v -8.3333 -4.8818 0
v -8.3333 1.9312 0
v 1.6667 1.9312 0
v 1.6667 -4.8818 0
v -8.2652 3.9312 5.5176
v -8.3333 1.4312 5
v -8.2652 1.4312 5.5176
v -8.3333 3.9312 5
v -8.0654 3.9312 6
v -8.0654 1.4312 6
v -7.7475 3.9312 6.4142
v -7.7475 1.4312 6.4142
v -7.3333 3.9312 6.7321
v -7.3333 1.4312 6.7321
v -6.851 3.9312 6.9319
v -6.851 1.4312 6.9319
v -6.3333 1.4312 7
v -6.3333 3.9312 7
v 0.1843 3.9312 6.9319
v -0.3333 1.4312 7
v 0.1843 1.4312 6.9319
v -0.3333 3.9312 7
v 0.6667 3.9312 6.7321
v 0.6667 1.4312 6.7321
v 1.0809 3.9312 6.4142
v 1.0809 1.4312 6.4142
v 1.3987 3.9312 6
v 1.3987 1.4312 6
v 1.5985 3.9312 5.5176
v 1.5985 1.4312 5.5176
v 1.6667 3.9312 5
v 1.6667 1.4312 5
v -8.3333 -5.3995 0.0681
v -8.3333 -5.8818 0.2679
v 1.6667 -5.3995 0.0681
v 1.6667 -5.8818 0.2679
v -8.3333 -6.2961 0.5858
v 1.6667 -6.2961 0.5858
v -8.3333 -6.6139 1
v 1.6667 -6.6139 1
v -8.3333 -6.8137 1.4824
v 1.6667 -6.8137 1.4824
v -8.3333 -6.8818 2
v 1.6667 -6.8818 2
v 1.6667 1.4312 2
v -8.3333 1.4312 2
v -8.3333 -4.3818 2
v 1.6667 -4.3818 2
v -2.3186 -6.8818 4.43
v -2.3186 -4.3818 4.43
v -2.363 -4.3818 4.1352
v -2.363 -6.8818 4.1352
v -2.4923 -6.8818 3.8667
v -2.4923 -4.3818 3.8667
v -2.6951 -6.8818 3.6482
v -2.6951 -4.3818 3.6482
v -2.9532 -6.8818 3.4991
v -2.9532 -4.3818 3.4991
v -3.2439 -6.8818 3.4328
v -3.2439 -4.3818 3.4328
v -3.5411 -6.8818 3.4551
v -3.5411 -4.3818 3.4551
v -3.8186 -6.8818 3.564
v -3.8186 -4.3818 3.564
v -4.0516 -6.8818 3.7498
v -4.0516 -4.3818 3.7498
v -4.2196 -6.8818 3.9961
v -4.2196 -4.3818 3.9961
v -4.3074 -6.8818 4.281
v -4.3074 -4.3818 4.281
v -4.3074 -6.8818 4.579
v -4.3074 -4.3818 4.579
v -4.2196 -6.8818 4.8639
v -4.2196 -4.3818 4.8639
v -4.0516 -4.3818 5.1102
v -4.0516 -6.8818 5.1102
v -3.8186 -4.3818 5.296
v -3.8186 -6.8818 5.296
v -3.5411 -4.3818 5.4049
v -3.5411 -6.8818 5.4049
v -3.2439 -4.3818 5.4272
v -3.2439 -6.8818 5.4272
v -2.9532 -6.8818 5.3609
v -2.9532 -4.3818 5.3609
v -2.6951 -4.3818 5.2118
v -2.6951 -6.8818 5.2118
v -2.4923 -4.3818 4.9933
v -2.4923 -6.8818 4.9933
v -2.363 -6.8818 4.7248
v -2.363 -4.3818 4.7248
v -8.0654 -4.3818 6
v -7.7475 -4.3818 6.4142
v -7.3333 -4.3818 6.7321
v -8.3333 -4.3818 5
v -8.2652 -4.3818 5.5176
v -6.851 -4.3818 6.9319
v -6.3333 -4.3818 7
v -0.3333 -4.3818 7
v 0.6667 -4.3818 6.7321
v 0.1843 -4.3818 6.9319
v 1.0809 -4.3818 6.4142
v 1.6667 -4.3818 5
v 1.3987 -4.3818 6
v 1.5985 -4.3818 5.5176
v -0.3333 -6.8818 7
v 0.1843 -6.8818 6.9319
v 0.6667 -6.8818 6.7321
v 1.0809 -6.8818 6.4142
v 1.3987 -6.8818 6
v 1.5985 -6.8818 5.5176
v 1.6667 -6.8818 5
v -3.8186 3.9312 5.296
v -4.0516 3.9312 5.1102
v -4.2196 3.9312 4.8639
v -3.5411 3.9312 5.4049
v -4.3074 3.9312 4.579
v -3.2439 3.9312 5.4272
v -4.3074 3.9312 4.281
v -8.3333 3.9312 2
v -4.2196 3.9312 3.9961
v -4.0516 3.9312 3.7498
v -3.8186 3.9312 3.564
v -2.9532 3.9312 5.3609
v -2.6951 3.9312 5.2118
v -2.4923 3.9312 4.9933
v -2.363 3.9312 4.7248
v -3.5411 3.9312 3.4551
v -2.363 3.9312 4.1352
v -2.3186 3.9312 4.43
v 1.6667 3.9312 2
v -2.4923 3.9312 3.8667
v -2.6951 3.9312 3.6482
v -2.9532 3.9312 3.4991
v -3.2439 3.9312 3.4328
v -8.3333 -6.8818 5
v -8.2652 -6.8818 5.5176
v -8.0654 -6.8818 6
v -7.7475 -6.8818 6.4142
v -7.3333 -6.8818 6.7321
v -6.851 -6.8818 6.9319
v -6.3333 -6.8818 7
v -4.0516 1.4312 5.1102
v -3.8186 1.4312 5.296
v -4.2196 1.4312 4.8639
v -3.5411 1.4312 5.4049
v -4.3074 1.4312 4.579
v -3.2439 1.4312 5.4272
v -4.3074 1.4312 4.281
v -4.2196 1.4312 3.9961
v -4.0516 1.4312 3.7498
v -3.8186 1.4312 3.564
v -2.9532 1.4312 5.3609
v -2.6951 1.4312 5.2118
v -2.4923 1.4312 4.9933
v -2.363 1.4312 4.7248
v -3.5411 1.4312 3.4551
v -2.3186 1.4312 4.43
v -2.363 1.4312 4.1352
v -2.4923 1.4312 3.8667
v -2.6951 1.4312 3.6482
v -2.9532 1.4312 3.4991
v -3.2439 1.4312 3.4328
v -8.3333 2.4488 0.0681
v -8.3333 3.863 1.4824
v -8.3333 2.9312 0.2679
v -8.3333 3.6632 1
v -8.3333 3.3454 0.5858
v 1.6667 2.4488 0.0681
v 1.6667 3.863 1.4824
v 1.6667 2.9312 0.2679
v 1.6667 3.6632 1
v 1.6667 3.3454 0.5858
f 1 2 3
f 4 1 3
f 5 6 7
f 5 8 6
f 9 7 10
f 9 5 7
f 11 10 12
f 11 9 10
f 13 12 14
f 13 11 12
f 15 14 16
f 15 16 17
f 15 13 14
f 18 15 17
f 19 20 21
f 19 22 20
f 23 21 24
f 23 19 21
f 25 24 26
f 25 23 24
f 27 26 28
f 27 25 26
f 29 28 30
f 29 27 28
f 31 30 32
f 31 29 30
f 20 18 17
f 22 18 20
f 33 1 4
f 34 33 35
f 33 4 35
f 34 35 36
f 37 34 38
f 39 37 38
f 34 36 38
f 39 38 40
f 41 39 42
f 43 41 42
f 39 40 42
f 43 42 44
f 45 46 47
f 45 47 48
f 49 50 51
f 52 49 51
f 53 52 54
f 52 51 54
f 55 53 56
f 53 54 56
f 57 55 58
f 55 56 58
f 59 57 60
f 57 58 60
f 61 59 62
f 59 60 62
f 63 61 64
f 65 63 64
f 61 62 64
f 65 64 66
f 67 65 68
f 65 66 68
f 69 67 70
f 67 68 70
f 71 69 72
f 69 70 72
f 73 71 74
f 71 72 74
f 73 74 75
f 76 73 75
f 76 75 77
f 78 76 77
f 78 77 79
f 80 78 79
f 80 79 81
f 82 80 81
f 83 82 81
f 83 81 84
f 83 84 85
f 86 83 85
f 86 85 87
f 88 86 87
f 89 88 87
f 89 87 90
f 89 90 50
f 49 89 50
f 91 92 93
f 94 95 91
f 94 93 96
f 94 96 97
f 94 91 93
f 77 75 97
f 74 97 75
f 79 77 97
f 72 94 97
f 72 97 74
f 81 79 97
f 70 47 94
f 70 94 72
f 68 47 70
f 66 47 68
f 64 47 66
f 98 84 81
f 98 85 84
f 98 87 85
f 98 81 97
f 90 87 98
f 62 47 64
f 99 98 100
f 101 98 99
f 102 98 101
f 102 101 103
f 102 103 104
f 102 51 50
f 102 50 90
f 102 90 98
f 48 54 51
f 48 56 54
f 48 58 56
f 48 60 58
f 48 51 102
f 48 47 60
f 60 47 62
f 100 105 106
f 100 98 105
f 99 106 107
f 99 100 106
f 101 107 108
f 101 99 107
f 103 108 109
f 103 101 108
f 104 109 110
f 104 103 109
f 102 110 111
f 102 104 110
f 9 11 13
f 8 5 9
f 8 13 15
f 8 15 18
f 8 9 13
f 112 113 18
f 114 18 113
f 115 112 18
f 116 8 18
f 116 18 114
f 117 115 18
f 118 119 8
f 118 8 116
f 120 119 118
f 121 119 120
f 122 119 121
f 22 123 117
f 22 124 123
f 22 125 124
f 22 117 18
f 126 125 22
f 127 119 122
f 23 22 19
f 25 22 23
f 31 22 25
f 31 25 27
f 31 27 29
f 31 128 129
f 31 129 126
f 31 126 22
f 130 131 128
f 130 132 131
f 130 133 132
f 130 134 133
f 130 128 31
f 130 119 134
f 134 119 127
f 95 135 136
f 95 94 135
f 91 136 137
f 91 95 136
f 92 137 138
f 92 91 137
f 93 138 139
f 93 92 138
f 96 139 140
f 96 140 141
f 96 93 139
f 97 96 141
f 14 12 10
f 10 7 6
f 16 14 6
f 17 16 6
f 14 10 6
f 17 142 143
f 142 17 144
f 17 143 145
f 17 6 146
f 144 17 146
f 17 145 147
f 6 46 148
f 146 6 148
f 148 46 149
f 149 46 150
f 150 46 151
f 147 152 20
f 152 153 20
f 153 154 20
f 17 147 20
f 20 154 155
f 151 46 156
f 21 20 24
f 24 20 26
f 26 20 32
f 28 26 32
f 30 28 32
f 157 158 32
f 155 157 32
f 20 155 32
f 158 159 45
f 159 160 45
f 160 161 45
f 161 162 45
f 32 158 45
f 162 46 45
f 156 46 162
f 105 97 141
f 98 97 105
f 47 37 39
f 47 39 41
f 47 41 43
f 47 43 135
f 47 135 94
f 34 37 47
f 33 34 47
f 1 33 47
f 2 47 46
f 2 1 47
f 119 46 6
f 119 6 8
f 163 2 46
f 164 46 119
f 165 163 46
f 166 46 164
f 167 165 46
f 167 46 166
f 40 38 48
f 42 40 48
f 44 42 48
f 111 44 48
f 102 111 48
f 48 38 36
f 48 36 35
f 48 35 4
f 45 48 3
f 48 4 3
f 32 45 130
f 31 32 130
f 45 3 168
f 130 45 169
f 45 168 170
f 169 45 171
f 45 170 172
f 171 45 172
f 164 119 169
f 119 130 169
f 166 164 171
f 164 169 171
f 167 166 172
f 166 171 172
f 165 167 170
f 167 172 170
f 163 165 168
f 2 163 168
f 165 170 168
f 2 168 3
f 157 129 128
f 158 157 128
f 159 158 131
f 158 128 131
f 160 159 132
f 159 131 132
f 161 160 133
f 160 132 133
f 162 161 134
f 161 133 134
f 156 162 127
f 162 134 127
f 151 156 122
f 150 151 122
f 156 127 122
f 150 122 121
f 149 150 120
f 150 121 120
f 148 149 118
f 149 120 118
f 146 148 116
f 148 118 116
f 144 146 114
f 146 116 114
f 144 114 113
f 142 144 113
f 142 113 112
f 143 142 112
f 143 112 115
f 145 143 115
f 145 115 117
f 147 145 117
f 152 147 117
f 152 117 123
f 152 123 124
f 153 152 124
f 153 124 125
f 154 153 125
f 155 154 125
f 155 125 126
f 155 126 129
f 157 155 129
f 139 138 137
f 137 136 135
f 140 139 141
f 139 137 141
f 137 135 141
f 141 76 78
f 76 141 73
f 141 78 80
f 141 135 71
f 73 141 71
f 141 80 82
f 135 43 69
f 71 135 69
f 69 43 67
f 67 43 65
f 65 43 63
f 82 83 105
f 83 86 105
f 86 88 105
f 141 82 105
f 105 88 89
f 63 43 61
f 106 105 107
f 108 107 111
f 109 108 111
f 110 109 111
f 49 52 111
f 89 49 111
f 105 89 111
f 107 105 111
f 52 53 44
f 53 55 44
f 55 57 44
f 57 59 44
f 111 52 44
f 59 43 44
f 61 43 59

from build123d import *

# Parameters (mm, degrees)
SKETCH1_W           = 10
SKETCH1_H           = 10.813
BOSS_EXTRUDE1_DEPTH = 2
SKETCH2_W           = 10
SKETCH2_H           = 2.5
BOSS_EXTRUDE2_DEPTH = 5
SKETCH3_R           = 1
CUT_EXTRUDE1_DEPTH  = 11.813
FILLET2_R           = 2


with BuildPart() as part:
    # Sketch1 → Boss-Extrude1 (new body)
    with BuildSketch(Plane.XY):
        with Locations((-3.333333333, -1.47534058)):
            Rectangle(SKETCH1_W, SKETCH1_H)
    extrude(amount=BOSS_EXTRUDE1_DEPTH)

    # Sketch2 → Boss-Extrude2 (add)
    with BuildSketch(Plane.XY.offset(2)):
        with Locations((-3.333333333, 2.68115942)):
            Rectangle(SKETCH2_W, SKETCH2_H)
        with Locations((-3.333333333, -5.63184058)):
            Rectangle(SKETCH2_W, SKETCH2_H)
    extrude(amount=BOSS_EXTRUDE2_DEPTH)

    # Sketch3 → Cut-Extrude1 (cut, through all)
    with BuildSketch(Plane(origin=(0, 3.93115942, 0), x_dir=(1, 0, 0), z_dir=(0, 1, 0))):
        with Locations((-3.318584334, -4.43)):
            Circle(SKETCH3_R)
    extrude(amount=-CUT_EXTRUDE1_DEPTH, mode=Mode.SUBTRACT)

    # Fillet2
    fillet2_edges = [part.edges().sort_by_distance(p)[0] for p in [
        (-8.333333333, 2.68115942, 7),
        (1.666666667, 2.68115942, 7),
        (1.666666667, -5.63184058, 7),
        (-8.333333333, -5.63184058, 7),
        (-3.333333333, 3.93115942, 0),
        (-3.333333333, -6.88184058, 0),
    ]]
    fillet(fillet2_edges, radius=FILLET2_R)


solid = part.part
